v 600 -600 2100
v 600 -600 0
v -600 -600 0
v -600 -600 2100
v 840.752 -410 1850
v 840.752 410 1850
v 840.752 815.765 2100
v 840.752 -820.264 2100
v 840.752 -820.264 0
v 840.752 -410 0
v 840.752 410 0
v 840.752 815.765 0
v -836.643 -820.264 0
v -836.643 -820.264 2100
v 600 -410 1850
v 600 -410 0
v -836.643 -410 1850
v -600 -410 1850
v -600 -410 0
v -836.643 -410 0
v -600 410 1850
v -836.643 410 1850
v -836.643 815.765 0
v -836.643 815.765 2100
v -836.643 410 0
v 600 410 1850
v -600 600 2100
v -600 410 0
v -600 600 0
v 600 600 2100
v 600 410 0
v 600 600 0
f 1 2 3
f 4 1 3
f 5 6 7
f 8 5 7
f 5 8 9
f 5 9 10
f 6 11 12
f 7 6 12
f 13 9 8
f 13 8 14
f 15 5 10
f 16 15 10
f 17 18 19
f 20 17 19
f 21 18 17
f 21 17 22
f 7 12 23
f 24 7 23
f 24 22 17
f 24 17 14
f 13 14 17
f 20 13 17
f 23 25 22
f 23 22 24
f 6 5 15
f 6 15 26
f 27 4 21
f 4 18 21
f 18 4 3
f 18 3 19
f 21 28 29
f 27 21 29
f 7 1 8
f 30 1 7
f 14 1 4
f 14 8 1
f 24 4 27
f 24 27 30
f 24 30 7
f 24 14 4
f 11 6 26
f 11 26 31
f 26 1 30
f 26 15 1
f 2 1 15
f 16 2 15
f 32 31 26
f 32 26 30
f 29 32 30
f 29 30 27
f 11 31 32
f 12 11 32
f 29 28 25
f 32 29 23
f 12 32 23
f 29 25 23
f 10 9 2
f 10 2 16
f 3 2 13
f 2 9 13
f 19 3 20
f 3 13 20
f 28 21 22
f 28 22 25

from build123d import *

# Parameters (mm, degrees)
SKETCH1_W           = 1636.029426001
SKETCH1_H           = 1677.394908568
SKETCH1_W_2         = 1200
SKETCH1_H_2         = 1200
BOSS_EXTRUDE1_DEPTH = 2100
SKETCH3_W           = 1850
SKETCH3_H           = 820
CUT_EXTRUDE1_DEPTH  = 2000


with BuildPart() as part:
    # Sketch1 → Boss-Extrude1 (new body)
    with BuildSketch(Plane(origin=(0, 0, 0), x_dir=(0, 1, 0), z_dir=(0, 0, 1))):
        with Locations((-2.249322435, -2.054950343)):
            Rectangle(SKETCH1_W, SKETCH1_H)
        Rectangle(SKETCH1_W_2, SKETCH1_H_2, mode=Mode.SUBTRACT)
    extrude(amount=BOSS_EXTRUDE1_DEPTH)

    # Sketch3 → Cut-Extrude1 (cut)
    with BuildSketch(Plane(origin=(840.752404627, 0, 0), x_dir=(0, 0, -1), z_dir=(1, 0, 0))):
        with Locations((-925, 0)):
            Rectangle(SKETCH3_W, SKETCH3_H)
    extrude(amount=-CUT_EXTRUDE1_DEPTH, mode=Mode.SUBTRACT)


solid = part.part
